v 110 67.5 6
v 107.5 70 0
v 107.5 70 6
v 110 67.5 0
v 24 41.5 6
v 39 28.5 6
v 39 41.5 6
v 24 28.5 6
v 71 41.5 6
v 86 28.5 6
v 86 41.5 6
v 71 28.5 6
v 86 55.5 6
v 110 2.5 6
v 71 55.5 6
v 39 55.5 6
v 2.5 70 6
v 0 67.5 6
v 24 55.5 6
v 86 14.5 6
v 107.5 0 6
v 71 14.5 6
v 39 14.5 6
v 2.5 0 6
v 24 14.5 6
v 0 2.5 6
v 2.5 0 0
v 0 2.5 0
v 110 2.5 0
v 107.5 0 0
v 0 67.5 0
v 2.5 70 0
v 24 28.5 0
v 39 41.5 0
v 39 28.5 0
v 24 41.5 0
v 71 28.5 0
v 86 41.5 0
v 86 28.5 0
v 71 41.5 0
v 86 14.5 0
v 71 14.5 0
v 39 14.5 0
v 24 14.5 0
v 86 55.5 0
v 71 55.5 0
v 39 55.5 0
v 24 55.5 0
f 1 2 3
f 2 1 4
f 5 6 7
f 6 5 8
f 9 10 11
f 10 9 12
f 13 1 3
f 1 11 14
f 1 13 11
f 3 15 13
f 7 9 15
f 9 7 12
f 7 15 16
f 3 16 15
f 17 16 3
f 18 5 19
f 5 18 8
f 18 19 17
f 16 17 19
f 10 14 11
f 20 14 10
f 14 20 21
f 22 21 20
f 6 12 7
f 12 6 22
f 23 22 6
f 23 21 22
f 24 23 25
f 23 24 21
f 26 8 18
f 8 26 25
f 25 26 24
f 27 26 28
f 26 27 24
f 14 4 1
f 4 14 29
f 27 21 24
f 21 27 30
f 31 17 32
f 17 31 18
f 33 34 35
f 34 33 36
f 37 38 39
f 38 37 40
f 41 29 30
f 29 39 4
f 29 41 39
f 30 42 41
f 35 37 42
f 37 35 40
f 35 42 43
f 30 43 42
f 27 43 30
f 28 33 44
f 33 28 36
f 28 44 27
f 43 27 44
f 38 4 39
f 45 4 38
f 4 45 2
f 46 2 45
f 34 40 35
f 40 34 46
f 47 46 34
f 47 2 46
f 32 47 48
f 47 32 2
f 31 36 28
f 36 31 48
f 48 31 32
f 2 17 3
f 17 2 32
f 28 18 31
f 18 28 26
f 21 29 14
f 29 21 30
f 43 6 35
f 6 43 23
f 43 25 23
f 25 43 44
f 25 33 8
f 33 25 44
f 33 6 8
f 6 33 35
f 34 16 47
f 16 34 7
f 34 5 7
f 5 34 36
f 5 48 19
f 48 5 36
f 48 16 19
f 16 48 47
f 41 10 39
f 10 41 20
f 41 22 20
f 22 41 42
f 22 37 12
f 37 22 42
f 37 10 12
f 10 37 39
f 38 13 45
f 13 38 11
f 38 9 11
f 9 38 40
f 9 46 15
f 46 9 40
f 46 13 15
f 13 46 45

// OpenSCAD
$fn = 32;

// ----------------------------------------------------------------------
// Windowed plate: 4 voids, 110 x 70 x 6 mm
// ----------------------------------------------------------------------

// --- parameters (mm) ---
plate_l = 110;            // plate length, X
plate_w = 70;             // plate width, Y
plate_t = 6;              // plate thickness, Z
edge_margin = 8;          // wall from the plate edge to any window
win_l = 15;               // pocket length
win_w = 14;               // pocket width
pitch_x = 47;             // grid pitch along X
pitch_y = 27;             // grid pitch along Y
depth_1 = 6;              // depth of void 1 (full thickness = through)
depth_2 = 6;              // depth of void 2 (full thickness = through)
depth_3 = 6;              // depth of void 3 (full thickness = through)
depth_4 = 6;              // depth of void 4 (full thickness = through)
corner_c = 2.5;           // corner chamfer of the plate

profile = [[2.5, 0], [107.5, 0], [110, 2.5], [110, 67.5], [107.5, 70], [2.5, 70], [0, 67.5], [0, 2.5]];  // primary outline, 8 points, counter clockwise
void_1 = [[24, 14.5], [39, 14.5], [39, 28.5], [24, 28.5]];  // pocket at grid node 0,0, 4 points
void_2 = [[24, 41.5], [39, 41.5], [39, 55.5], [24, 55.5]];  // pocket at grid node 0,1, 4 points
void_3 = [[71, 14.5], [86, 14.5], [86, 28.5], [71, 28.5]];  // pocket at grid node 1,0, 4 points
void_4 = [[71, 41.5], [86, 41.5], [86, 55.5], [71, 55.5]];  // pocket at grid node 1,1, 4 points

// --- the one profile operation ---
difference() {
  linear_extrude(height = plate_t) polygon(points = profile);
  translate([0, 0, -1])
    linear_extrude(height = plate_t + 2) polygon(points = void_1);
  translate([0, 0, -1])
    linear_extrude(height = plate_t + 2) polygon(points = void_2);
  translate([0, 0, -1])
    linear_extrude(height = plate_t + 2) polygon(points = void_3);
  translate([0, 0, -1])
    linear_extrude(height = plate_t + 2) polygon(points = void_4);
}
